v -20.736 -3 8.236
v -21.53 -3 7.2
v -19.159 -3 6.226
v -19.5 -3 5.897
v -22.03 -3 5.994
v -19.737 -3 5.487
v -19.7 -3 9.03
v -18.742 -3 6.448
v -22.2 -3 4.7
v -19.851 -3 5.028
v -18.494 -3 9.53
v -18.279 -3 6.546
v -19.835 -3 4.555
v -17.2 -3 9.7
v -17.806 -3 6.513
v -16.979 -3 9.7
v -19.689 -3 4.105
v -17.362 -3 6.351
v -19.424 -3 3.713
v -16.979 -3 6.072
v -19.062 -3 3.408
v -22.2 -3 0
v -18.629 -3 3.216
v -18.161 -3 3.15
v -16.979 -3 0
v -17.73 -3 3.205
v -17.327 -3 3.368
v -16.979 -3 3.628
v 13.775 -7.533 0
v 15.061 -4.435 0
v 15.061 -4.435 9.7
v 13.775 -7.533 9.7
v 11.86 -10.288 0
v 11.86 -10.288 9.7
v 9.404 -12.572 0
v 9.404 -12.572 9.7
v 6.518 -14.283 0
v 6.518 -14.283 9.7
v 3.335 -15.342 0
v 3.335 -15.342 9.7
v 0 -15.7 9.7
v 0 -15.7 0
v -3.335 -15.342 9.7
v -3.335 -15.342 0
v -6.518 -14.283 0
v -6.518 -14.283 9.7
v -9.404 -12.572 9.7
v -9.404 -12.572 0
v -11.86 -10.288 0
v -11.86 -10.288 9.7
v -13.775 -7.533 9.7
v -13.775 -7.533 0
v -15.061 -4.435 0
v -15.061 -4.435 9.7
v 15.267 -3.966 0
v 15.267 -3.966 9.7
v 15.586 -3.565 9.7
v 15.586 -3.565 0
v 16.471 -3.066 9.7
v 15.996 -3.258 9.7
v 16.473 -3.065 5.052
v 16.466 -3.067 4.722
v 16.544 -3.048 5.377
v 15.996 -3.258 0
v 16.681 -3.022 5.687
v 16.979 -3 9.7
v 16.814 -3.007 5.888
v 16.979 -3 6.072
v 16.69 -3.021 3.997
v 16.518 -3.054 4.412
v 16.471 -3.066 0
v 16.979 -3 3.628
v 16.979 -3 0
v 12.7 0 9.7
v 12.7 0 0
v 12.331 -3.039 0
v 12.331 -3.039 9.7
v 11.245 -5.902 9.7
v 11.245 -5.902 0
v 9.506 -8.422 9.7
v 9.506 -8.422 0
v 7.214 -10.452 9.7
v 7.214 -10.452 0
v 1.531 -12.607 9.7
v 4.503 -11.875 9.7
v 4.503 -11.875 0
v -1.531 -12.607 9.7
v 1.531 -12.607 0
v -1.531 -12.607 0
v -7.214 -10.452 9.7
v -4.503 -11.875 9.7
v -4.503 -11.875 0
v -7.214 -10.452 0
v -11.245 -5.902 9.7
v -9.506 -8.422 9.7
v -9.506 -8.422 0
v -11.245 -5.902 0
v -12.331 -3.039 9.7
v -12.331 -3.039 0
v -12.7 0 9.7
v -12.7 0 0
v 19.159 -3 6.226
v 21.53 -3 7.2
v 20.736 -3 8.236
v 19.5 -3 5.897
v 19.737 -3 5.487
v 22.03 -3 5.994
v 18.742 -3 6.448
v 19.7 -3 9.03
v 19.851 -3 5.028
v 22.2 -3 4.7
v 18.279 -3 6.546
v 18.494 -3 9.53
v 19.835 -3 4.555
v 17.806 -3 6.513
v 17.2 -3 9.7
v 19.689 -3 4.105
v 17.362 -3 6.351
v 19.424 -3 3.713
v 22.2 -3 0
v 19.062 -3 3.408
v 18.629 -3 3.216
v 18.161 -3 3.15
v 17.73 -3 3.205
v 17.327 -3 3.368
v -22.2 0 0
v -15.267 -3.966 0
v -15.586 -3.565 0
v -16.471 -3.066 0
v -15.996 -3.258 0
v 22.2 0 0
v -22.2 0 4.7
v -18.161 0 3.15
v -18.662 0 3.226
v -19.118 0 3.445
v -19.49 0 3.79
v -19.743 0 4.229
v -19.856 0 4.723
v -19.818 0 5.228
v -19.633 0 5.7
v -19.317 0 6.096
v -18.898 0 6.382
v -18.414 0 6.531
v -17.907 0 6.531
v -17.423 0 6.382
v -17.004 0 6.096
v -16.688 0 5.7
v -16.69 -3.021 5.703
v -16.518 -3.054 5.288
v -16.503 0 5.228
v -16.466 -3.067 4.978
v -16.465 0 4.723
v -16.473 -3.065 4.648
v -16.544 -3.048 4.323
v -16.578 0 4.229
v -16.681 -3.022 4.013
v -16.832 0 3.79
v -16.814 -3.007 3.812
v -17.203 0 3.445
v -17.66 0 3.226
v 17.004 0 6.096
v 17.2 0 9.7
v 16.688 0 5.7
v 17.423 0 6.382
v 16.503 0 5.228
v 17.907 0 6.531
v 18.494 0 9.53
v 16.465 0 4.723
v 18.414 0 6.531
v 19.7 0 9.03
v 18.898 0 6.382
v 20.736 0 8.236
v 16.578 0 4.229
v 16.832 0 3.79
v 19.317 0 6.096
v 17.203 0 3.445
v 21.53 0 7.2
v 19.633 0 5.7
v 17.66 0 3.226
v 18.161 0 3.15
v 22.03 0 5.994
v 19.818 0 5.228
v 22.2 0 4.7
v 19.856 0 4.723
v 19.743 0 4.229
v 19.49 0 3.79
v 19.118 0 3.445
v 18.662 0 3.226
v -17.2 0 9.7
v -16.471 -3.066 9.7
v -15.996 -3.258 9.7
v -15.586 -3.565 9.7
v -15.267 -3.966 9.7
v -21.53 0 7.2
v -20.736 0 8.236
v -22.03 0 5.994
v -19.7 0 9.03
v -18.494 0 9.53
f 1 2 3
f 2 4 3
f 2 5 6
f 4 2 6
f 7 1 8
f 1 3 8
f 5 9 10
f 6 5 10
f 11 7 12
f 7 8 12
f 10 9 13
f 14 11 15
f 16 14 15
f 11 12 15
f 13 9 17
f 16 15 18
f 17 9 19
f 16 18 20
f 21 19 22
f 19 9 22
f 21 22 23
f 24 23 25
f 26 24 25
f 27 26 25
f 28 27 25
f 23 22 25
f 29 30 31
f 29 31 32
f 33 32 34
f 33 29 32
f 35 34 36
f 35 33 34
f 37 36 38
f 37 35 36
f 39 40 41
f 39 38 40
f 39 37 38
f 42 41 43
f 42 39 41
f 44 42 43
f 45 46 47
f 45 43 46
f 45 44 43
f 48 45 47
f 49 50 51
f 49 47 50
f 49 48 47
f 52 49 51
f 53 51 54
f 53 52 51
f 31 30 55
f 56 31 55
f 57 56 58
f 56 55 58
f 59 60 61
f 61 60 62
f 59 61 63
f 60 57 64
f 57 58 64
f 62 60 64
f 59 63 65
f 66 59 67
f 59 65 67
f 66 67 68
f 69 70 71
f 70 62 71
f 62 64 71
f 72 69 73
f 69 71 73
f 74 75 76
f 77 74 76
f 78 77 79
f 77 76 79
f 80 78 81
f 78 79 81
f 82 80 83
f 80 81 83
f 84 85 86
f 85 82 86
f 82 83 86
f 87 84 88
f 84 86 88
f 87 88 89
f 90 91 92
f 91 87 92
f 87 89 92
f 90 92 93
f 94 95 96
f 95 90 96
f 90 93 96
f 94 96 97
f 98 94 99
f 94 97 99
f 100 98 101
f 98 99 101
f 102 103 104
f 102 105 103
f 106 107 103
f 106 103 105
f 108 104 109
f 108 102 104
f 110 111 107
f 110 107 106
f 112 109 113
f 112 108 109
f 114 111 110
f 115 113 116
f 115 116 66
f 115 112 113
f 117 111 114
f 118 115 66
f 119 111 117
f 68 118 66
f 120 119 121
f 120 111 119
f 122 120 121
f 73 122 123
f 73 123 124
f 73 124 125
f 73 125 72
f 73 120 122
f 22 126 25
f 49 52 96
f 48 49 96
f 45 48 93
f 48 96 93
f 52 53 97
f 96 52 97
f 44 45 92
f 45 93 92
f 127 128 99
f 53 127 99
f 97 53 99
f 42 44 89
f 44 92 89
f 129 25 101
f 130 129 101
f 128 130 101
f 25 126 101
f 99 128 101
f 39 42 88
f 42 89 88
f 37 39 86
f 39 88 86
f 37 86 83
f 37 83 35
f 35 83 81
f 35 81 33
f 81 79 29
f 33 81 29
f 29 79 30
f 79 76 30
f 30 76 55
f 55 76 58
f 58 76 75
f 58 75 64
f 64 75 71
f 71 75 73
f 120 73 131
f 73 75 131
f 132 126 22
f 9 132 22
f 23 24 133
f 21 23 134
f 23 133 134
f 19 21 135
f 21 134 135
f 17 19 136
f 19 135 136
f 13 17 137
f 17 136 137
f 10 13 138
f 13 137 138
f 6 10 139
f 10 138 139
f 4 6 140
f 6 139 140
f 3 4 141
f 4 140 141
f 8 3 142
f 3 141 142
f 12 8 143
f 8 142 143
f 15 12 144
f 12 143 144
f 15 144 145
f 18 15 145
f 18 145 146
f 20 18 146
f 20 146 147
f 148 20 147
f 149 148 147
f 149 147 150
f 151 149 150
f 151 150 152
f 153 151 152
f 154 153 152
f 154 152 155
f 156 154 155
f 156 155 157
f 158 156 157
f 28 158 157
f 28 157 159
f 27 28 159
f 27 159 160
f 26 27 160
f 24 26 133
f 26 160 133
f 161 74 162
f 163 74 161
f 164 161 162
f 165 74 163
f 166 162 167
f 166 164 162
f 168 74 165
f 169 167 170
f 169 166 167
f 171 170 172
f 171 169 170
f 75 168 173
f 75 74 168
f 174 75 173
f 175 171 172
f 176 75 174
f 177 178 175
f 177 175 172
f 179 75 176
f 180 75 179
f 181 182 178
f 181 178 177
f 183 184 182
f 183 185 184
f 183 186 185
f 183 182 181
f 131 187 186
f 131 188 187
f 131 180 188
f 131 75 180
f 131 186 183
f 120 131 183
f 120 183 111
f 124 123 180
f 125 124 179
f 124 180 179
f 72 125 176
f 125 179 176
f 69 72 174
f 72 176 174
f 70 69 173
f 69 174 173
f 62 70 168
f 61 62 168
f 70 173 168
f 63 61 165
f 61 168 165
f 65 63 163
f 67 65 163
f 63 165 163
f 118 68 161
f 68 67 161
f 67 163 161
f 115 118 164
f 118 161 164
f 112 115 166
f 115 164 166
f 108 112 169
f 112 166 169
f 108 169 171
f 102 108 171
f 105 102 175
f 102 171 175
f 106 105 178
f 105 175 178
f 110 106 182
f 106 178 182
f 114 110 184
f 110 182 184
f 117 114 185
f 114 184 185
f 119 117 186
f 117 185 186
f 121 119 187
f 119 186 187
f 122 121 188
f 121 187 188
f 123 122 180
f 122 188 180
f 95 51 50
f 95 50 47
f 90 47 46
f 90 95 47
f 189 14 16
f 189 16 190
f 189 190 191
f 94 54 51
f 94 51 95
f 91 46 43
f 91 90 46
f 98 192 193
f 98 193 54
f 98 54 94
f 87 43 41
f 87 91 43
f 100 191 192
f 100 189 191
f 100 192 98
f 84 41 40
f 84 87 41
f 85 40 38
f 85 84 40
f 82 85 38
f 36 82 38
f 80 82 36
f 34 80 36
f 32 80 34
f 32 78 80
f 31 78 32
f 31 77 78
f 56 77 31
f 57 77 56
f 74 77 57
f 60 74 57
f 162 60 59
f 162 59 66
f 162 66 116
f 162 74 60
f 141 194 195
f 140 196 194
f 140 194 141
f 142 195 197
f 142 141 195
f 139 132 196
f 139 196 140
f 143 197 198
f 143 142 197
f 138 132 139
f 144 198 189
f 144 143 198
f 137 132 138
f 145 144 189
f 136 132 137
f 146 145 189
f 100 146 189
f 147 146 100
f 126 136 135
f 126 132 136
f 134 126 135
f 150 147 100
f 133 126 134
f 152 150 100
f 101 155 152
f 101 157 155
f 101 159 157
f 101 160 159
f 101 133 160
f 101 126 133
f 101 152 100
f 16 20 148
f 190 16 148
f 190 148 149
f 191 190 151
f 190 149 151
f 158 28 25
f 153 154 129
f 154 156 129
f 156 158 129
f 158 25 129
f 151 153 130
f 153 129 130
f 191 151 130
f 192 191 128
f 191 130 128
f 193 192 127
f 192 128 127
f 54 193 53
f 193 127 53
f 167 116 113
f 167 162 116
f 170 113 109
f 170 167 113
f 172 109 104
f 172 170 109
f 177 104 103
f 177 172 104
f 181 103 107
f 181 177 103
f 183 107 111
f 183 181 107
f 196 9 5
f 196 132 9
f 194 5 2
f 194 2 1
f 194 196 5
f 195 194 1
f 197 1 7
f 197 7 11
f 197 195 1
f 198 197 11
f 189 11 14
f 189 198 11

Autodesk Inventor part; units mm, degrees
ref_plane "YZ Plane" through (0, 0, 0) normal (1, 0, 0) x (0, 1, 0)
ref_plane "XZ Plane" through (0, 0, 0) normal (0, 1, 0) x (-1, 0, 0)
ref_plane "XY Plane" through (0, 0, 0) normal (0, 0, 1) x (1, 0, 0)
sketch "Sketch1" plane through (0, 0, 0) normal (0, 0, 1) x (1, 0, 0)
  line L0 (12.7, 0) -> (22.2, 0)
  line L1 (22.2, 0) -> (22.2, -3)
  line L2 (22.2, -3) -> (12.7, -3)
  line L3 (12.7, -3) -> (12.7, 0)
  circle A0 centre (0, 0) radius 12.7
  circle A1 centre (0, 0) radius 15.7
  line L4 (-15.7, 0) -> (-12.7, 0)
  line L5 (12.7, 0) -> (15.7, 0)
  line L6 (-12.7, 0) -> (-22.2, 0)
  line L7 (-22.2, 0) -> (-22.2, -3)
  line L8 (-22.2, -3) -> (-12.7, -3)
  line L9 (-12.7, -3) -> (-12.7, 0)
  dimension "d0" = 12.7
  dimension "d1" = 3
  dimension "d2" = 3
  dimension "d3" = 6.5
extrude "Extrusion1" add sketch "Sketch1" along normal blind 9.7 contours L0 A1 L2 L3 | L3 L2 A1 L8 L9 A0 | L0 L1 L2 A1 | L9 L8 A1 L4 | A1 L8 L7 L6
sketch "Sketch2" plane through (15.4107, -3, 0) normal (0, -1, 0) x (1, 0, 0)
  line L0 (0, 9.7) -> (0, 0) projected
  line L1 (0, 4.85) -> (2.75, 4.85)
  circle A0 centre (2.75, 4.85) radius 2.75
  point P0 (-15.4107, 0)
  dimension "d6" = 5.5
hole "Hole1" at (18.1607, -3, 4.85) direction (0, 1, 0) diameter 3.4 end through all
ref_plane "Work Plane1" through (0, -3, 0) normal (1, 0, 0) x (0, 0, -1)
mirror "Mirror1" about plane through (0, -3, 0) normal (1, 0, 0) of "Hole1"
fillet "Fillet1" radius 5 2 edges at (-22.2, -1.5, 9.7) (22.2, -1.5, 9.7)
fillet "Fillet1" radius 2 2 edges at (15.4107, -3, 4.85) (-15.4107, -3, 4.85)
properties part number "bottom_fitting"
